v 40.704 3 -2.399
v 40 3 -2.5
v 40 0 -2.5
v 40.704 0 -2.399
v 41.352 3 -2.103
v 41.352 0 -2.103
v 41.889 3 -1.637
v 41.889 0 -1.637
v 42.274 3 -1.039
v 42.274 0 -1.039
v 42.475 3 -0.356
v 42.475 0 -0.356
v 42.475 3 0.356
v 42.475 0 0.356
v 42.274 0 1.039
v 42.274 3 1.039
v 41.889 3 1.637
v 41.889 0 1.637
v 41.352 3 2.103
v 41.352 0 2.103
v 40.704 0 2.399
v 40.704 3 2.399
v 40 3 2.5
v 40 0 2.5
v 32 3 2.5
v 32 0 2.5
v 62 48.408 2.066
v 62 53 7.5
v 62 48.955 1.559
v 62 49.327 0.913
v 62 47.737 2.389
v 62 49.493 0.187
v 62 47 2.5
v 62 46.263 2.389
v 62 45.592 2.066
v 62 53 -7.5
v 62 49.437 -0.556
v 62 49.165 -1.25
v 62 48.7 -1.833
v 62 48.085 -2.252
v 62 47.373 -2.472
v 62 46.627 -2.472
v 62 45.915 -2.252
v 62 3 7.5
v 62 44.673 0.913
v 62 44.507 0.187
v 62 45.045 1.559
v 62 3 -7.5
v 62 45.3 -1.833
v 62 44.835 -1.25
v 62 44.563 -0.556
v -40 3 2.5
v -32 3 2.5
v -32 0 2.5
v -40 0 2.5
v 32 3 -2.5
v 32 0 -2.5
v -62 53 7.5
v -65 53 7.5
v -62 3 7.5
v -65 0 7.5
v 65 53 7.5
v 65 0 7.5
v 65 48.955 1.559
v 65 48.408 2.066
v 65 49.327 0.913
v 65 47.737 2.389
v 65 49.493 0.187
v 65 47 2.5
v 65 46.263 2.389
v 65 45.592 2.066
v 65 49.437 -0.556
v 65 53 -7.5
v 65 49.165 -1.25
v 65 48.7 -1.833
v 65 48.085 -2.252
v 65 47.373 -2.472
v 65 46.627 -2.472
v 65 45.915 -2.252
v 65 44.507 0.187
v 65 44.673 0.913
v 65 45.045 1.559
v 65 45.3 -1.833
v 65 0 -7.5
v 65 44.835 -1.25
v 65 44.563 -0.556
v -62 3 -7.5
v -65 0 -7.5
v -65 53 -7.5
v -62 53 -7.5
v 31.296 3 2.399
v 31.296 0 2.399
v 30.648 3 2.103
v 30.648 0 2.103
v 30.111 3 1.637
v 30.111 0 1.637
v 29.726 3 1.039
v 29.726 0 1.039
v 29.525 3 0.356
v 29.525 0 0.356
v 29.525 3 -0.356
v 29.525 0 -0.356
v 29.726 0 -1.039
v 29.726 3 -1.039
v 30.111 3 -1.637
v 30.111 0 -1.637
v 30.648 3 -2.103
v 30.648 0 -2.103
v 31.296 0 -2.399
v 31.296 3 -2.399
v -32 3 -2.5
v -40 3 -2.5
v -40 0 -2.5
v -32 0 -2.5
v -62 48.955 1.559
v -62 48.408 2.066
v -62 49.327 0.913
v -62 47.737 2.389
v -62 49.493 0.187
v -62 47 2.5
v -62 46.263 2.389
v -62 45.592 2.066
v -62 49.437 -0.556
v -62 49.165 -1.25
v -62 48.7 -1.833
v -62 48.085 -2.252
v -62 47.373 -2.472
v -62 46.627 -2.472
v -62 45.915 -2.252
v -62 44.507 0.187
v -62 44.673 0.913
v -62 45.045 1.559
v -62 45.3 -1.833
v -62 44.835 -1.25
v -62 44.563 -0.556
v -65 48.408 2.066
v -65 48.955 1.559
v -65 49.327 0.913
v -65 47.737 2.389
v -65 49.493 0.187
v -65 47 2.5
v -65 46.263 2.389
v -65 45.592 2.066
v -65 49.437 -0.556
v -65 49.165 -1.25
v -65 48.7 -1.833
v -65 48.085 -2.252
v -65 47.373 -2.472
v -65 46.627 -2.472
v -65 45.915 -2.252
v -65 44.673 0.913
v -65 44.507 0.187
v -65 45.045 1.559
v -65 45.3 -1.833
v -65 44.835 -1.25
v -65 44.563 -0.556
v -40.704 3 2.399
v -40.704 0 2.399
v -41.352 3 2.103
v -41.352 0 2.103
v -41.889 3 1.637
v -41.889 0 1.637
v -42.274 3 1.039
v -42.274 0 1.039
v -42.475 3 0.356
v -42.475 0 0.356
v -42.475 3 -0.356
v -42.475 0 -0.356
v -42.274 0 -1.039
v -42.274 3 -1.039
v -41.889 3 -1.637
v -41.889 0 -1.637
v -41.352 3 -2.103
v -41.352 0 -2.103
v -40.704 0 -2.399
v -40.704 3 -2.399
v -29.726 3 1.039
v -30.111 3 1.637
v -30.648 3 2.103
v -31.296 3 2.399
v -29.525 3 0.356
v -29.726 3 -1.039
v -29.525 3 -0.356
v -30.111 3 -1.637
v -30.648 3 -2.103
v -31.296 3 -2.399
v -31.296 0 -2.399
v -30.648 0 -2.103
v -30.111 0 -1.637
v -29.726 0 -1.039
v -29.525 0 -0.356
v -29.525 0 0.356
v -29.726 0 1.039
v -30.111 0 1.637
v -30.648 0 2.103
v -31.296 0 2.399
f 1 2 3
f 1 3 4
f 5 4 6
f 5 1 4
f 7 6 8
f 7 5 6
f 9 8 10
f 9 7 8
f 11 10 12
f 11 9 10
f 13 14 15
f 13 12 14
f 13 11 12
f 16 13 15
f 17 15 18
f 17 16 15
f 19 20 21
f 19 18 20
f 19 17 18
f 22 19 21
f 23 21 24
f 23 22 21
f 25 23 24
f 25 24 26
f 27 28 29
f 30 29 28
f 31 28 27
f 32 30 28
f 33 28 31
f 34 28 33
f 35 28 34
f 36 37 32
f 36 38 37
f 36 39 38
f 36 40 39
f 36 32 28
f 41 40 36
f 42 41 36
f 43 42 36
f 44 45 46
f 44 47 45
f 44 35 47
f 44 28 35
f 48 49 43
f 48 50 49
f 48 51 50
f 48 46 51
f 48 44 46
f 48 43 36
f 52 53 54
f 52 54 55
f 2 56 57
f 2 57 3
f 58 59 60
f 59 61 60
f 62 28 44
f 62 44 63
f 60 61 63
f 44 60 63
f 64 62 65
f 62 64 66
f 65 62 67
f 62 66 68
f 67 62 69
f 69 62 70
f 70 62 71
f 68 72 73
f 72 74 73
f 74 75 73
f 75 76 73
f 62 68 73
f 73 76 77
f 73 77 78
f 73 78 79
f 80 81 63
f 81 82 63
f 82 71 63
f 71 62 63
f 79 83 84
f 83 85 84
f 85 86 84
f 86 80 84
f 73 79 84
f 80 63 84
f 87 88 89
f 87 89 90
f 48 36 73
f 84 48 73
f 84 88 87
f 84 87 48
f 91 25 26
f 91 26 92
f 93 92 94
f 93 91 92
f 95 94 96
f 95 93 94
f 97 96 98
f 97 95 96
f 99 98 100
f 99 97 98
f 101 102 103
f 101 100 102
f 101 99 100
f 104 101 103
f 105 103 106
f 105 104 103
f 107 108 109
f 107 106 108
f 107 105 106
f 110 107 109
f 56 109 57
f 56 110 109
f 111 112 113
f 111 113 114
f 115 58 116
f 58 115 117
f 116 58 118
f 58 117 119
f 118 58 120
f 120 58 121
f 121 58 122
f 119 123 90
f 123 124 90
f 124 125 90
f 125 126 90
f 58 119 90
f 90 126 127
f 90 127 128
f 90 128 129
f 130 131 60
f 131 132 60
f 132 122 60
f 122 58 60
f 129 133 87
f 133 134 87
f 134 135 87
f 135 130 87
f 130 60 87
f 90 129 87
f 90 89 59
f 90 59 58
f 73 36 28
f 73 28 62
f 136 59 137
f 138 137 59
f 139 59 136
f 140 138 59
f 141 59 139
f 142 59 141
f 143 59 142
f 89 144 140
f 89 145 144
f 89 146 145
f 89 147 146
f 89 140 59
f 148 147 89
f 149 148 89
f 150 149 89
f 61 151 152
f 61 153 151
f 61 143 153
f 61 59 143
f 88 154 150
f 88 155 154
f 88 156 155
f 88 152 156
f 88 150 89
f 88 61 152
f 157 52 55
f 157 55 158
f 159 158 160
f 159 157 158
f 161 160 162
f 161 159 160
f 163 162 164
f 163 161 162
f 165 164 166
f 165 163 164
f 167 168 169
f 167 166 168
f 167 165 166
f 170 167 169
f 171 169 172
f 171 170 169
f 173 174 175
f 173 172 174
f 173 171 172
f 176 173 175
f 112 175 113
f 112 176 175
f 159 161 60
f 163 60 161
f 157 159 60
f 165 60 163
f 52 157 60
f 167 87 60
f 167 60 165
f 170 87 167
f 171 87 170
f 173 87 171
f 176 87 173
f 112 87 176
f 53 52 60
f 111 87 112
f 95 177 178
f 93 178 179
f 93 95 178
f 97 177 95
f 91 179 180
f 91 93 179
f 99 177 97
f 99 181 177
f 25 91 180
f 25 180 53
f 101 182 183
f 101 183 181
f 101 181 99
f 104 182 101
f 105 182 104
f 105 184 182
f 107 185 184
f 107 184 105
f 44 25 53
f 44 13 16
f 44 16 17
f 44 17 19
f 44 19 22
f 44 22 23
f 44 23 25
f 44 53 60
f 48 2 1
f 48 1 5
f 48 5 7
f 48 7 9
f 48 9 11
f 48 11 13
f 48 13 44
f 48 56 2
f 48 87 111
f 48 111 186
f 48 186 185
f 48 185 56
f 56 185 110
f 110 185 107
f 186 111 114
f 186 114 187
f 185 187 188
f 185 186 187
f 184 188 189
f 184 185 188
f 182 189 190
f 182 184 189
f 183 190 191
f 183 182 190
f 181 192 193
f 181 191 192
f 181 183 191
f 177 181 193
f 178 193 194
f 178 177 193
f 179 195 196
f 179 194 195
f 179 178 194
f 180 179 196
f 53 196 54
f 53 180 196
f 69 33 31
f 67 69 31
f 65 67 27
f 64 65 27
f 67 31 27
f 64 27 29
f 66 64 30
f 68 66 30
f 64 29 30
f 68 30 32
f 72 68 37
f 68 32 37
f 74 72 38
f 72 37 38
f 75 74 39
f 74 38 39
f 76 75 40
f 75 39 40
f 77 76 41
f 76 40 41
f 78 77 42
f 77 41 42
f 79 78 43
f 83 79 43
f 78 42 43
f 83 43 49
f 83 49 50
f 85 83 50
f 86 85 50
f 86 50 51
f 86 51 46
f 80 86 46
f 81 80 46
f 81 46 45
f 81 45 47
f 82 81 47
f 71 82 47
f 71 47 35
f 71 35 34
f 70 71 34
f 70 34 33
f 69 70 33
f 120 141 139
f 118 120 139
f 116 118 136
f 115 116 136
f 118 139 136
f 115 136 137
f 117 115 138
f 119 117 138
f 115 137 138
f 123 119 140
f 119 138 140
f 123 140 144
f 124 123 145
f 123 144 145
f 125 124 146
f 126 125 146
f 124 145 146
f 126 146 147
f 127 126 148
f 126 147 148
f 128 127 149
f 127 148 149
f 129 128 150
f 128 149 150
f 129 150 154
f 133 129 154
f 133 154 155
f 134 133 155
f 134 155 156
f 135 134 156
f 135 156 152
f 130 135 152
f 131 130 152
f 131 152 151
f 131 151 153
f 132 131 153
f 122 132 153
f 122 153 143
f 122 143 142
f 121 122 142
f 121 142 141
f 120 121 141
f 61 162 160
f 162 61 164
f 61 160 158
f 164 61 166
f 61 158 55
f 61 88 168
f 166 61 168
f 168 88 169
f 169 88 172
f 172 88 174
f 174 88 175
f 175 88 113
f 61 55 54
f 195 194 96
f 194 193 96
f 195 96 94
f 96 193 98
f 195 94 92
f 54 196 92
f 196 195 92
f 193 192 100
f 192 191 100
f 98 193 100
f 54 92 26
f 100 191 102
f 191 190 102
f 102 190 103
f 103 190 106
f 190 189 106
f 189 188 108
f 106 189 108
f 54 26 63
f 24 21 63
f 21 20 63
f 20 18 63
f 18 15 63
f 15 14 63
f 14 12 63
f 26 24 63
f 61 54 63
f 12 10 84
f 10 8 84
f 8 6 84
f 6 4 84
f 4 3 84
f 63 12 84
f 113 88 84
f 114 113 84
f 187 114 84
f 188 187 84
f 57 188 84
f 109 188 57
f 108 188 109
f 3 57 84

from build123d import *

# Parameters (mm, degrees)
SKETCH_3_W          = 130
SKETCH_3_H          = 15
EXTRUDE_1_DEPTH     = 3
CUT_EXTRUDE_1_DEPTH = 35
SKETCH_5_W          = 3
SKETCH_5_H          = 15
EXTRUDE_2_DEPTH     = 50
SKETCH_6_R          = 2.5
CUT_EXTRUDE_2_DEPTH = 160


with BuildPart() as part:
    # 草图3 → 凸台-拉伸1 (new body)
    with BuildSketch(Plane(origin=(0, 0, 0), x_dir=(1, 0, 0), z_dir=(0, 1, 0))):
        Rectangle(SKETCH_3_W, SKETCH_3_H)
    extrude(amount=EXTRUDE_1_DEPTH)

    # 草图4 → 切除-拉伸1 (cut)
    with BuildSketch(Plane(origin=(0, 3, 0), x_dir=(1, 0, 0), z_dir=(0, 1, 0))):
        with BuildLine():
            Line((-40, 2.5), (-32, 2.5))
            ThreePointArc((-32, 2.5), (-29.5, 0), (-32, -2.5))
            Line((-32, -2.5), (-40, -2.5))
            ThreePointArc((-40, -2.5), (-42.5, 0), (-40, 2.5))
        make_face()
        with BuildLine():
            Line((40, -2.5), (32, -2.5))
            ThreePointArc((32, -2.5), (29.5, 0), (32, 2.5))
            Line((32, 2.5), (40, 2.5))
            ThreePointArc((40, 2.5), (42.5, 0), (40, -2.5))
        make_face()
    extrude(amount=-CUT_EXTRUDE_1_DEPTH, mode=Mode.SUBTRACT)

    # 草图5 → 凸台-拉伸2 (add)
    with BuildSketch(Plane(origin=(0, 3, 0), x_dir=(1, 0, 0), z_dir=(0, 1, 0))):
        with Locations((-63.5, 0)):
            Rectangle(SKETCH_5_W, SKETCH_5_H)
        with Locations((63.5, 0)):
            Rectangle(SKETCH_5_W, SKETCH_5_H)
    extrude(amount=EXTRUDE_2_DEPTH)

    # 草图6 → 切除-拉伸2 (cut)
    with BuildSketch(Plane.ZY.offset(65)):
        with Locations((0, 47)):
            Circle(SKETCH_6_R)
    extrude(amount=-CUT_EXTRUDE_2_DEPTH, mode=Mode.SUBTRACT)


solid = part.part
